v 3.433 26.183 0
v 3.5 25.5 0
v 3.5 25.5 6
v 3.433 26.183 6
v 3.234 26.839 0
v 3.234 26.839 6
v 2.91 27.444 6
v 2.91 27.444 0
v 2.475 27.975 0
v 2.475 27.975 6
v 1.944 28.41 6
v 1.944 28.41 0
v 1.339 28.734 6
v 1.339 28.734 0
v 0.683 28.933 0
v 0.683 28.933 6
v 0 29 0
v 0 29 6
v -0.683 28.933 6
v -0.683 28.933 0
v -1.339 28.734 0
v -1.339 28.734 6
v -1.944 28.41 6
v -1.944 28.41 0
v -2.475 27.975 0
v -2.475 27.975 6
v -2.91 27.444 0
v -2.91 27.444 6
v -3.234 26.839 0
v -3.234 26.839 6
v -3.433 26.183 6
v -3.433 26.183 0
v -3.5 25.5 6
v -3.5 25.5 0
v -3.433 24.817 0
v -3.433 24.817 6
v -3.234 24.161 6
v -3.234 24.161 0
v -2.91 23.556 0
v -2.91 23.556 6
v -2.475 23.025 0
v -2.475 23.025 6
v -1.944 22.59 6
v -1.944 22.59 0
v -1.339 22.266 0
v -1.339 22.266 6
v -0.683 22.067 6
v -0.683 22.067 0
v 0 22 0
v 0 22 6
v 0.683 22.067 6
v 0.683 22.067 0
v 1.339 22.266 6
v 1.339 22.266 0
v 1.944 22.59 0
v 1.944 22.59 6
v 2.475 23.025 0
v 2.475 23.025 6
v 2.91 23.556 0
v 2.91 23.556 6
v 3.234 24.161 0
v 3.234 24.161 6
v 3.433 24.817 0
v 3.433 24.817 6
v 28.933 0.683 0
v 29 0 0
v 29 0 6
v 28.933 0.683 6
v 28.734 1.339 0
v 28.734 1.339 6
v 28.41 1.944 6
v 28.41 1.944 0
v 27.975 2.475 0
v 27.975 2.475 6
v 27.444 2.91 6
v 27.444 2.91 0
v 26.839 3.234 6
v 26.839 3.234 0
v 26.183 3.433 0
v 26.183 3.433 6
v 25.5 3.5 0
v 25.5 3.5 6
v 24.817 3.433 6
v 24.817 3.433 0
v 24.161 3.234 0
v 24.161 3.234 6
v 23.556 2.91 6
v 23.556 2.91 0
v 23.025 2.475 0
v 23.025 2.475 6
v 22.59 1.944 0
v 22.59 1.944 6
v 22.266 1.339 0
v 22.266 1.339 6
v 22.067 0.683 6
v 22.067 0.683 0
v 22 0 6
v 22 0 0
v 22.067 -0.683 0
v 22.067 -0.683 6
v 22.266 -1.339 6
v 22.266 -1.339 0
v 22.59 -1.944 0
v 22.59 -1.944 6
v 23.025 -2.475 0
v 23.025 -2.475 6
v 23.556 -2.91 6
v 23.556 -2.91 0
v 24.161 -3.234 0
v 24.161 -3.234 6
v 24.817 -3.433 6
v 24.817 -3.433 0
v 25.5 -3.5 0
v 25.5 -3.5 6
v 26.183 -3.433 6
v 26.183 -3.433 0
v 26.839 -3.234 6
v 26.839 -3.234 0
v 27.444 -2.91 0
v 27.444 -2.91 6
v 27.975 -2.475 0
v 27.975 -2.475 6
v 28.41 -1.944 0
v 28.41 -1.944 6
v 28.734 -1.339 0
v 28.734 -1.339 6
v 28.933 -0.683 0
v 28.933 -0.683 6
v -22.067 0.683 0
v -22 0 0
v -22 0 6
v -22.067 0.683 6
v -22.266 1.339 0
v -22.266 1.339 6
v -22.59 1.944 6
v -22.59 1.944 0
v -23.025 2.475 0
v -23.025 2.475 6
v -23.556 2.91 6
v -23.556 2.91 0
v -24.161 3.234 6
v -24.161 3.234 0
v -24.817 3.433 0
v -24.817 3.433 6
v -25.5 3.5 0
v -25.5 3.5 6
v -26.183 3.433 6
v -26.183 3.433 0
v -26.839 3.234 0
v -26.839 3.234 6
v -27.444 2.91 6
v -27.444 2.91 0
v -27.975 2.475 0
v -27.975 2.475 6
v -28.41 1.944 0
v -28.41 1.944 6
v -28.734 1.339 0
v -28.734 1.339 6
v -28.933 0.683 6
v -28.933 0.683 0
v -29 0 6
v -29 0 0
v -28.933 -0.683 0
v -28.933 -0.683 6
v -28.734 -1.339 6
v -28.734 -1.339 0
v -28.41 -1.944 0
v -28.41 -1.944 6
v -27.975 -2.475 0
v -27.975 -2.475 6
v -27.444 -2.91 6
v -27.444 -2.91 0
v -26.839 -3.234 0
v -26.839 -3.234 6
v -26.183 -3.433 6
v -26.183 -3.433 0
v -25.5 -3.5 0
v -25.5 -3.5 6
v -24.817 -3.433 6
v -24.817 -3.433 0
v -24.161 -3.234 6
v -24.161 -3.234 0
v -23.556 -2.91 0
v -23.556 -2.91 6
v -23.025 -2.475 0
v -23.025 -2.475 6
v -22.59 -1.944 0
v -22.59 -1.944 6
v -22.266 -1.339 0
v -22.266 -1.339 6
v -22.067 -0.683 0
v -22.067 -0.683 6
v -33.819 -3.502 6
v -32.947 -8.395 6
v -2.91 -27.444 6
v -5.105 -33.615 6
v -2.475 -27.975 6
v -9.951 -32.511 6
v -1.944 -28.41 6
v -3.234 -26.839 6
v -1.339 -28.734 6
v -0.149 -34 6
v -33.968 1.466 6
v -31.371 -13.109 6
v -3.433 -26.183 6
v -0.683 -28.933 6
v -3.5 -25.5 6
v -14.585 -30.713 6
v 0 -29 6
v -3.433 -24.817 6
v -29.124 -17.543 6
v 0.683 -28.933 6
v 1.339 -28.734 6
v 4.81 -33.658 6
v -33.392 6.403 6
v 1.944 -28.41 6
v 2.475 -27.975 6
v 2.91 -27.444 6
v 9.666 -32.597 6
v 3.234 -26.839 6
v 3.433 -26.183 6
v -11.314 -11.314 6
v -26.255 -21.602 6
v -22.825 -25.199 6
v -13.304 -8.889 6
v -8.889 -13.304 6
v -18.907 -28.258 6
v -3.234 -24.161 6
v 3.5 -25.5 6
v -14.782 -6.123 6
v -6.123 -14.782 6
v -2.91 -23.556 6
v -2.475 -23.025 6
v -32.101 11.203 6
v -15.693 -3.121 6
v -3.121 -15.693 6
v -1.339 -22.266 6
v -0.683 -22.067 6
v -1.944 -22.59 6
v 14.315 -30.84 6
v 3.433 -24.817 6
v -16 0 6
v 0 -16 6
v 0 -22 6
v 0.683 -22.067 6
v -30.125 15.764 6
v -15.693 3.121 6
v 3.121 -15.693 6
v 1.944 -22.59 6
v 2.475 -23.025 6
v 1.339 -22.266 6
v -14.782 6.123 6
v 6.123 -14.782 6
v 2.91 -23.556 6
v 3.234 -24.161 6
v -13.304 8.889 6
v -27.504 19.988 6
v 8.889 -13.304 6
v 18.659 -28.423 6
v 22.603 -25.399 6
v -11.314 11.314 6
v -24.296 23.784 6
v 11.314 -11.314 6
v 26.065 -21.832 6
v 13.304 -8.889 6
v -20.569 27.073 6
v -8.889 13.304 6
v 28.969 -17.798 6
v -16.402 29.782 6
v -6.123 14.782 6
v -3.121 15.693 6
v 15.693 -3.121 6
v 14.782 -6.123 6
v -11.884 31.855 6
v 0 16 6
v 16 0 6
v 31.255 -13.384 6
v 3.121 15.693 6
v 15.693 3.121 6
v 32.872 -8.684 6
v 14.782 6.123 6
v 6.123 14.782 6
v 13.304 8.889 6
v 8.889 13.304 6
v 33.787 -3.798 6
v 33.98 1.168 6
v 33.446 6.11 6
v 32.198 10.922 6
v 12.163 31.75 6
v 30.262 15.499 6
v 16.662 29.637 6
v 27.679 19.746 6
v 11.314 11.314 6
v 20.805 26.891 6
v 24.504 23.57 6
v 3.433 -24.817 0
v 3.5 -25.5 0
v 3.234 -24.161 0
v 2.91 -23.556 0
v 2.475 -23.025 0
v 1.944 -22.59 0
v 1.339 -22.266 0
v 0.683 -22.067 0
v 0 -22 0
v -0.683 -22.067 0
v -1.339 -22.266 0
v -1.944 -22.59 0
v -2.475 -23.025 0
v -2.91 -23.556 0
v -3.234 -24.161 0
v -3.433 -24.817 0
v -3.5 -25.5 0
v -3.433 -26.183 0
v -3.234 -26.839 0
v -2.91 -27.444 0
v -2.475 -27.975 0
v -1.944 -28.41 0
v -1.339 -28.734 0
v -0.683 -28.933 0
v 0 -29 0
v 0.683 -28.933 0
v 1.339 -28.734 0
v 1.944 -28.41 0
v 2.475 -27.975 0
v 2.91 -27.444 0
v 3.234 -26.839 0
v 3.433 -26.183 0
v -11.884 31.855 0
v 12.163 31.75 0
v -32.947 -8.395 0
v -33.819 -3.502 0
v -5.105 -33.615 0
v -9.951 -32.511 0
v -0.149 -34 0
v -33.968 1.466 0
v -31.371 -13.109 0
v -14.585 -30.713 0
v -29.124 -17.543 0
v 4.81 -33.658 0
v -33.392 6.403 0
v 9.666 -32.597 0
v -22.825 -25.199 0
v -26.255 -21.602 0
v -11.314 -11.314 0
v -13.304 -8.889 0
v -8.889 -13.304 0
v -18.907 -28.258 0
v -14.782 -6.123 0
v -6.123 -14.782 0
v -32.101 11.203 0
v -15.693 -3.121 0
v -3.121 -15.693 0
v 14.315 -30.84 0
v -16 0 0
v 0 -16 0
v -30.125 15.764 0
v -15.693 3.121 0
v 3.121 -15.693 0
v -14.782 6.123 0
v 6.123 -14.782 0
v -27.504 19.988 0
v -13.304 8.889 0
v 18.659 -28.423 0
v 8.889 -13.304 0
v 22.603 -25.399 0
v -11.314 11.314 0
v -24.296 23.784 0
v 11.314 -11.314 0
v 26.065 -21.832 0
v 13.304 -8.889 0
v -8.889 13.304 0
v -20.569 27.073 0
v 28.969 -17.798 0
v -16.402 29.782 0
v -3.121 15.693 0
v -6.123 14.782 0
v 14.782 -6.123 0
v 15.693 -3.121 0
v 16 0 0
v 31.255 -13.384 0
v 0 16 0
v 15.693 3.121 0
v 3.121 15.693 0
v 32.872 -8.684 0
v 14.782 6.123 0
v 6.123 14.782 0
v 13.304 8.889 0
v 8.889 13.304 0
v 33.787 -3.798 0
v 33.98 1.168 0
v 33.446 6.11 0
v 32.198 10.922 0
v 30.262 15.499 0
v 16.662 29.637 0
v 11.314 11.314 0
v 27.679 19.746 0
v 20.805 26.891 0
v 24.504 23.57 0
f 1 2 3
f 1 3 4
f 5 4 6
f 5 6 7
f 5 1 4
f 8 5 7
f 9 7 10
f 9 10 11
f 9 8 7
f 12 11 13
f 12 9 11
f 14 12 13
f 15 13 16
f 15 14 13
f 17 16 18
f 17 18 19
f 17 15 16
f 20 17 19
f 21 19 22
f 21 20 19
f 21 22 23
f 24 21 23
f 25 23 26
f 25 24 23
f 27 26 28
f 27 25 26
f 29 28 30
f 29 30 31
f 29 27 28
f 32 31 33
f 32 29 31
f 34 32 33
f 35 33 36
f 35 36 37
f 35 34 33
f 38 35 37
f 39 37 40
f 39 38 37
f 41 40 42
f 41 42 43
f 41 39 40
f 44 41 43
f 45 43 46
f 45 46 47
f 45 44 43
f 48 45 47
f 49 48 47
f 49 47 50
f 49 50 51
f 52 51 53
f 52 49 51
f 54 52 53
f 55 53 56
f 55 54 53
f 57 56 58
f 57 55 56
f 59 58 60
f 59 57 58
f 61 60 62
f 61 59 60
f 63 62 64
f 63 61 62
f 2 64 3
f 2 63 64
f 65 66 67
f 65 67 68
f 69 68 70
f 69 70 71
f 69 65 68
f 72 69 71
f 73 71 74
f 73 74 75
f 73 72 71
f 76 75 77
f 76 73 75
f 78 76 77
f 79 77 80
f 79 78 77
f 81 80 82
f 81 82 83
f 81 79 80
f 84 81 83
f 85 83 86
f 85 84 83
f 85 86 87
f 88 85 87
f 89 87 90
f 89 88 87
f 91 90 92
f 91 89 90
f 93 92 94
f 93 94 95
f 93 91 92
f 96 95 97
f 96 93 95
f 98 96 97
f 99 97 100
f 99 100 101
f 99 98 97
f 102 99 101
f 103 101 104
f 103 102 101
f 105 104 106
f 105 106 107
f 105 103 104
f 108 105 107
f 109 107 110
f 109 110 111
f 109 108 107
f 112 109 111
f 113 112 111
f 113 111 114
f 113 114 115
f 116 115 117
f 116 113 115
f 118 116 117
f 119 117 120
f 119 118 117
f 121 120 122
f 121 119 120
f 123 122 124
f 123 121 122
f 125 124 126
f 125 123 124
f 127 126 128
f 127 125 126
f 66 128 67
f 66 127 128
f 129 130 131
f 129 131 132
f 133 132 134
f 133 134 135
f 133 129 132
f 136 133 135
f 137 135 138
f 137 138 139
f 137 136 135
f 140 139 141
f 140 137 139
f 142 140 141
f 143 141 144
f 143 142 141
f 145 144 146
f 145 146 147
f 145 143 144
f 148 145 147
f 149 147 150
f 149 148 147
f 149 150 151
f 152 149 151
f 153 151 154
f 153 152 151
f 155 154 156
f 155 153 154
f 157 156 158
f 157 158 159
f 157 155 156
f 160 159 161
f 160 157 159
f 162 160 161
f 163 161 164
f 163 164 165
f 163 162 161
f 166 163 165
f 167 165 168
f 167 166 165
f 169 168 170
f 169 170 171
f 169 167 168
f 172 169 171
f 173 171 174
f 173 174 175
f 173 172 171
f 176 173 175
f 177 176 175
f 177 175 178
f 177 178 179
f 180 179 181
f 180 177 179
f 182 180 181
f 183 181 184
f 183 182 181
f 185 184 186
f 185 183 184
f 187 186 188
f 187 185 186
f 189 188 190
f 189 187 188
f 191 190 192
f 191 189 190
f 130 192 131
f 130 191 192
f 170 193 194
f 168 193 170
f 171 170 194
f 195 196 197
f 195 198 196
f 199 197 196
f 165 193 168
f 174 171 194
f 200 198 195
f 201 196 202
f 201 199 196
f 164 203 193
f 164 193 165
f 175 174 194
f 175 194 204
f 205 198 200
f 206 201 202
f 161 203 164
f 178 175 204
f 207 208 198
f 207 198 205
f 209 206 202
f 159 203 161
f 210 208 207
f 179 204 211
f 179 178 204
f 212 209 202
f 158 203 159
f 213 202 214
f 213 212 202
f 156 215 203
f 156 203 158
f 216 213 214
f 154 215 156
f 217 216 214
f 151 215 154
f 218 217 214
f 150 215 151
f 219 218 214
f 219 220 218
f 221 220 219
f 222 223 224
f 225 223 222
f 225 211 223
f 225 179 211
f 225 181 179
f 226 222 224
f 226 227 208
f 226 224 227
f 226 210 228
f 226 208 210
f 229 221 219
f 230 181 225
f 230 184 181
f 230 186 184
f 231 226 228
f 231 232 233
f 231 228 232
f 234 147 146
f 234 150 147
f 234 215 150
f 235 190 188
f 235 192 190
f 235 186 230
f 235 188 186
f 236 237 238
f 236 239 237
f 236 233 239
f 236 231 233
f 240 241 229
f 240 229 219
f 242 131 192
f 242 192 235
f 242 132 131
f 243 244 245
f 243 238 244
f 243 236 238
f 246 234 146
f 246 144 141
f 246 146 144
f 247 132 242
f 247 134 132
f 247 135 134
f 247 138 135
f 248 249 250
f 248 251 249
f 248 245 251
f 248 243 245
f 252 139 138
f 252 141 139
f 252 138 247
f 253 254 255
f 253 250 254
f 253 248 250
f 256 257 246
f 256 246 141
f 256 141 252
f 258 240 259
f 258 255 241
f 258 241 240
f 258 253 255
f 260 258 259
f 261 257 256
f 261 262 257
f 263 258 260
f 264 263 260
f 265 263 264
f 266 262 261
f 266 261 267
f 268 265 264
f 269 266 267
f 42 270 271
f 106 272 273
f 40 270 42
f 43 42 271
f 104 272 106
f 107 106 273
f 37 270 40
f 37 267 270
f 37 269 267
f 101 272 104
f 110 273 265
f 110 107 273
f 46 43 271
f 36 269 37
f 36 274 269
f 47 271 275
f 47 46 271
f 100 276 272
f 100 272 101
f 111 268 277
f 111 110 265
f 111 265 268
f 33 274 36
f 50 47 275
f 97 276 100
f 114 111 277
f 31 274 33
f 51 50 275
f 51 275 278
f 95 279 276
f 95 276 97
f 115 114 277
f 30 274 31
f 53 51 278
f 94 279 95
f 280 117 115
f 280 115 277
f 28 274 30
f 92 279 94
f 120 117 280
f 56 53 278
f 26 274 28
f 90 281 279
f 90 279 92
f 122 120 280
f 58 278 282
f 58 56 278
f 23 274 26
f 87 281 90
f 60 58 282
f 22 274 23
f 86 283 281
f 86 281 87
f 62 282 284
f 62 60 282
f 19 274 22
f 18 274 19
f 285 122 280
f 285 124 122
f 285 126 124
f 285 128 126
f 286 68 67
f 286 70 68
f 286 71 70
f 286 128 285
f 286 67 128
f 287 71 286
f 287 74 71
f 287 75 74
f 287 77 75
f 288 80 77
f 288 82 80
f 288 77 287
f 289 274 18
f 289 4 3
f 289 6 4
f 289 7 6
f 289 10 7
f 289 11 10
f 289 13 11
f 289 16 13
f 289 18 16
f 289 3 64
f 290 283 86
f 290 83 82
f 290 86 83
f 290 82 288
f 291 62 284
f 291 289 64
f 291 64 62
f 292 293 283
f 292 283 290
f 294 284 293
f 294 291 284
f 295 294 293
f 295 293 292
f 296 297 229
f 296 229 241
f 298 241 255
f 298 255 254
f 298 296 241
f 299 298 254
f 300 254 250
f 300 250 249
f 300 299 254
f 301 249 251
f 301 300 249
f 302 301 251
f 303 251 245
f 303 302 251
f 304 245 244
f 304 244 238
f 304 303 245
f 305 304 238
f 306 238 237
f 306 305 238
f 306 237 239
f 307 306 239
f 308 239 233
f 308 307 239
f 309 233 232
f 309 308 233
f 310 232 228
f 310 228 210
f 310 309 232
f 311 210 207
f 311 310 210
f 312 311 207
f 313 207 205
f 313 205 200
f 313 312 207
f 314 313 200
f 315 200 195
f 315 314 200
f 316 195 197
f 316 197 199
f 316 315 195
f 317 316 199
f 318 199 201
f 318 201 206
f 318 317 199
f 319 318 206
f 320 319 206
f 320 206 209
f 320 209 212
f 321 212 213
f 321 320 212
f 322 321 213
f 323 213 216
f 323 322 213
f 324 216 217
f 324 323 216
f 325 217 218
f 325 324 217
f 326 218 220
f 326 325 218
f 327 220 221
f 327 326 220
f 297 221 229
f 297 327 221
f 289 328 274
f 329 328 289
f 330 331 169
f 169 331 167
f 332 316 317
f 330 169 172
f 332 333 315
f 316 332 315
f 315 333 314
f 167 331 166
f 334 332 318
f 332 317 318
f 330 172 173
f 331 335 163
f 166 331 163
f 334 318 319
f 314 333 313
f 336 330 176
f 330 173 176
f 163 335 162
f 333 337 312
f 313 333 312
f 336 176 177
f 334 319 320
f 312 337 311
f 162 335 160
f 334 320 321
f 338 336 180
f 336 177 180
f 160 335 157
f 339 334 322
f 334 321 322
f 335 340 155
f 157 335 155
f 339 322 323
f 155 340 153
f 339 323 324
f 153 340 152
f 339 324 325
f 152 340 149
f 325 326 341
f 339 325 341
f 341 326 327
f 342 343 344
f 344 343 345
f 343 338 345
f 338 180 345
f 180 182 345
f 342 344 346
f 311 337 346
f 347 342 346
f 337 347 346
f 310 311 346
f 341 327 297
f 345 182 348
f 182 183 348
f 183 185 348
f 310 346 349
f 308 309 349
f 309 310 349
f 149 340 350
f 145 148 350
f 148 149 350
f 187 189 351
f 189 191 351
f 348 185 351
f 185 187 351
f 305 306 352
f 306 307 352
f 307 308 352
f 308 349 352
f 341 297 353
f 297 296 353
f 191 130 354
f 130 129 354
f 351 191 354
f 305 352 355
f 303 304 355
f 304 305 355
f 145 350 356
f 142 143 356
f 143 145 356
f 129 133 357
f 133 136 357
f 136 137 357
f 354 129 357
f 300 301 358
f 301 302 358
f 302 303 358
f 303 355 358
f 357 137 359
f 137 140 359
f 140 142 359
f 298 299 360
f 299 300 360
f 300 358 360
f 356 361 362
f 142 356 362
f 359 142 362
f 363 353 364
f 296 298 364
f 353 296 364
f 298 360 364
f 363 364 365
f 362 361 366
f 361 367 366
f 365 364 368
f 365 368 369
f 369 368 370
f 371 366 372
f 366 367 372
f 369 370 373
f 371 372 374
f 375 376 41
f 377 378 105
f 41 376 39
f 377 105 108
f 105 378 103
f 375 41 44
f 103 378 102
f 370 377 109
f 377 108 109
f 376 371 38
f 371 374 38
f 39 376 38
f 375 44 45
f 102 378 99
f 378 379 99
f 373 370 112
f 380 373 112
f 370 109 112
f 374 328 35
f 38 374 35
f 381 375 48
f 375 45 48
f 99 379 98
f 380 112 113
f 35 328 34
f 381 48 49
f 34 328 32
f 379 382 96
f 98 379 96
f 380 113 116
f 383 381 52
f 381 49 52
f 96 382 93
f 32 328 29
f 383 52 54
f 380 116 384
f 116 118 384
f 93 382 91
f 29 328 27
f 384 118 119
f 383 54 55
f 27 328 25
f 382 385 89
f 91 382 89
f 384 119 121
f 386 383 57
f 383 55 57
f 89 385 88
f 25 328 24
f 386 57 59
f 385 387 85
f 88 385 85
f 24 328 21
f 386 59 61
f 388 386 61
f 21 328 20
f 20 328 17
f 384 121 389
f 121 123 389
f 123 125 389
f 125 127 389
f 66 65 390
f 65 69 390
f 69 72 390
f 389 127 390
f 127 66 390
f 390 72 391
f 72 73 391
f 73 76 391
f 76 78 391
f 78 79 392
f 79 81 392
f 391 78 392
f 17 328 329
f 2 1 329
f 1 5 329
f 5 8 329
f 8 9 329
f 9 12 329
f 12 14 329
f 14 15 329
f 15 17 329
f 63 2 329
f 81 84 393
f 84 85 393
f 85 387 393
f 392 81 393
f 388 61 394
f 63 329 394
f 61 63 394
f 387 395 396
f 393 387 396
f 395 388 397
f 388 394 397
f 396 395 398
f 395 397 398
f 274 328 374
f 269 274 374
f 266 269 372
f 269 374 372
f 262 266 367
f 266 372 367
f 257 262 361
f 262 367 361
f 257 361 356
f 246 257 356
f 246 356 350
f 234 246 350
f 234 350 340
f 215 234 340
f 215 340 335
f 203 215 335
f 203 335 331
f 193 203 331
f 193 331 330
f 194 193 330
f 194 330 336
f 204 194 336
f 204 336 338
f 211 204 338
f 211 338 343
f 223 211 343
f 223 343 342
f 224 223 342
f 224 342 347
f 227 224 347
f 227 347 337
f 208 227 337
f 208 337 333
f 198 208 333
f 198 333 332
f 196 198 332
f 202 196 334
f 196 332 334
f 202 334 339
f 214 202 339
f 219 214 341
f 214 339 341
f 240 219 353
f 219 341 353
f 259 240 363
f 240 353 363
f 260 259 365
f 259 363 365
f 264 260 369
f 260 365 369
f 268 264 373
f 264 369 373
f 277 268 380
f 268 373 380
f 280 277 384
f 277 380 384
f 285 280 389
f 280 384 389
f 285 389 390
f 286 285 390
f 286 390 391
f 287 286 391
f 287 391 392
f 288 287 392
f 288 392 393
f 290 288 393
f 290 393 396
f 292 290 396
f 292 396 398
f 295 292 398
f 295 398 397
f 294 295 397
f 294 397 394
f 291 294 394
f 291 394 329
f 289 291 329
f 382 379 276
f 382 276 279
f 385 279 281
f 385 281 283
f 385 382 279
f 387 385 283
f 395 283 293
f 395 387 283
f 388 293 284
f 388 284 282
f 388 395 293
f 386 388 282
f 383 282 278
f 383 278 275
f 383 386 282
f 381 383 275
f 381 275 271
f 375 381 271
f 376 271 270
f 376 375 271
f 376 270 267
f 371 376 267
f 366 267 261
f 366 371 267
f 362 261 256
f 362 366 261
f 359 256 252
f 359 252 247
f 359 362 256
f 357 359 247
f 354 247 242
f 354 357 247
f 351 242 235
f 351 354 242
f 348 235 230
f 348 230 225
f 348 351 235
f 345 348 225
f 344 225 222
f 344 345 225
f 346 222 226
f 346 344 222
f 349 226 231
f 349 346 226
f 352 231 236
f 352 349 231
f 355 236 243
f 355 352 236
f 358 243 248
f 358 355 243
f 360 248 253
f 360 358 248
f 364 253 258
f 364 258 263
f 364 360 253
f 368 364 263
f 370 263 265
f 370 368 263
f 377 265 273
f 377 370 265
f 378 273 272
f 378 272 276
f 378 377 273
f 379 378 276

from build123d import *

# Parameters (mm, degrees)
ESBO_O1_R                = 34
ESBO_O1_R_2              = 16
ESBO_O1_R_3              = 3.5
RESSALTO_EXTRUS_O1_DEPTH = 6
CORTE_EXTRUS_O1_START    = -10
CORTE_EXTRUS_O1_DEPTH    = 10


with BuildPart() as part:
    # Esboço1 → Ressalto-extrusão1 (new body)
    with BuildSketch(Plane.XY):
        Circle(ESBO_O1_R)
        Circle(ESBO_O1_R_2, mode=Mode.SUBTRACT)
        with Locations((0, 25.5)):
            Circle(ESBO_O1_R_3, mode=Mode.SUBTRACT)
        with Locations((25.5, 0)):
            Circle(ESBO_O1_R_3, mode=Mode.SUBTRACT)
        with Locations((0, -25.5)):
            Circle(ESBO_O1_R_3, mode=Mode.SUBTRACT)
        with Locations((-25.5, 0)):
            Circle(ESBO_O1_R_3, mode=Mode.SUBTRACT)
    extrude(amount=RESSALTO_EXTRUS_O1_DEPTH)

    # Esboço2 → Corte-extrusão1 (cut)
    with BuildSketch(Plane.XY.offset(6).offset(CORTE_EXTRUS_O1_START)):
        with BuildLine():
            Line((-11.884080362, 31.855433351), (12.162956055, 31.75))
            ThreePointArc((12.162956055, 31.75), (0.149070322, 33.999673205), (-11.884080362, 31.855433351))
        make_face()
    extrude(amount=CORTE_EXTRUS_O1_DEPTH, mode=Mode.SUBTRACT)


solid = part.part
